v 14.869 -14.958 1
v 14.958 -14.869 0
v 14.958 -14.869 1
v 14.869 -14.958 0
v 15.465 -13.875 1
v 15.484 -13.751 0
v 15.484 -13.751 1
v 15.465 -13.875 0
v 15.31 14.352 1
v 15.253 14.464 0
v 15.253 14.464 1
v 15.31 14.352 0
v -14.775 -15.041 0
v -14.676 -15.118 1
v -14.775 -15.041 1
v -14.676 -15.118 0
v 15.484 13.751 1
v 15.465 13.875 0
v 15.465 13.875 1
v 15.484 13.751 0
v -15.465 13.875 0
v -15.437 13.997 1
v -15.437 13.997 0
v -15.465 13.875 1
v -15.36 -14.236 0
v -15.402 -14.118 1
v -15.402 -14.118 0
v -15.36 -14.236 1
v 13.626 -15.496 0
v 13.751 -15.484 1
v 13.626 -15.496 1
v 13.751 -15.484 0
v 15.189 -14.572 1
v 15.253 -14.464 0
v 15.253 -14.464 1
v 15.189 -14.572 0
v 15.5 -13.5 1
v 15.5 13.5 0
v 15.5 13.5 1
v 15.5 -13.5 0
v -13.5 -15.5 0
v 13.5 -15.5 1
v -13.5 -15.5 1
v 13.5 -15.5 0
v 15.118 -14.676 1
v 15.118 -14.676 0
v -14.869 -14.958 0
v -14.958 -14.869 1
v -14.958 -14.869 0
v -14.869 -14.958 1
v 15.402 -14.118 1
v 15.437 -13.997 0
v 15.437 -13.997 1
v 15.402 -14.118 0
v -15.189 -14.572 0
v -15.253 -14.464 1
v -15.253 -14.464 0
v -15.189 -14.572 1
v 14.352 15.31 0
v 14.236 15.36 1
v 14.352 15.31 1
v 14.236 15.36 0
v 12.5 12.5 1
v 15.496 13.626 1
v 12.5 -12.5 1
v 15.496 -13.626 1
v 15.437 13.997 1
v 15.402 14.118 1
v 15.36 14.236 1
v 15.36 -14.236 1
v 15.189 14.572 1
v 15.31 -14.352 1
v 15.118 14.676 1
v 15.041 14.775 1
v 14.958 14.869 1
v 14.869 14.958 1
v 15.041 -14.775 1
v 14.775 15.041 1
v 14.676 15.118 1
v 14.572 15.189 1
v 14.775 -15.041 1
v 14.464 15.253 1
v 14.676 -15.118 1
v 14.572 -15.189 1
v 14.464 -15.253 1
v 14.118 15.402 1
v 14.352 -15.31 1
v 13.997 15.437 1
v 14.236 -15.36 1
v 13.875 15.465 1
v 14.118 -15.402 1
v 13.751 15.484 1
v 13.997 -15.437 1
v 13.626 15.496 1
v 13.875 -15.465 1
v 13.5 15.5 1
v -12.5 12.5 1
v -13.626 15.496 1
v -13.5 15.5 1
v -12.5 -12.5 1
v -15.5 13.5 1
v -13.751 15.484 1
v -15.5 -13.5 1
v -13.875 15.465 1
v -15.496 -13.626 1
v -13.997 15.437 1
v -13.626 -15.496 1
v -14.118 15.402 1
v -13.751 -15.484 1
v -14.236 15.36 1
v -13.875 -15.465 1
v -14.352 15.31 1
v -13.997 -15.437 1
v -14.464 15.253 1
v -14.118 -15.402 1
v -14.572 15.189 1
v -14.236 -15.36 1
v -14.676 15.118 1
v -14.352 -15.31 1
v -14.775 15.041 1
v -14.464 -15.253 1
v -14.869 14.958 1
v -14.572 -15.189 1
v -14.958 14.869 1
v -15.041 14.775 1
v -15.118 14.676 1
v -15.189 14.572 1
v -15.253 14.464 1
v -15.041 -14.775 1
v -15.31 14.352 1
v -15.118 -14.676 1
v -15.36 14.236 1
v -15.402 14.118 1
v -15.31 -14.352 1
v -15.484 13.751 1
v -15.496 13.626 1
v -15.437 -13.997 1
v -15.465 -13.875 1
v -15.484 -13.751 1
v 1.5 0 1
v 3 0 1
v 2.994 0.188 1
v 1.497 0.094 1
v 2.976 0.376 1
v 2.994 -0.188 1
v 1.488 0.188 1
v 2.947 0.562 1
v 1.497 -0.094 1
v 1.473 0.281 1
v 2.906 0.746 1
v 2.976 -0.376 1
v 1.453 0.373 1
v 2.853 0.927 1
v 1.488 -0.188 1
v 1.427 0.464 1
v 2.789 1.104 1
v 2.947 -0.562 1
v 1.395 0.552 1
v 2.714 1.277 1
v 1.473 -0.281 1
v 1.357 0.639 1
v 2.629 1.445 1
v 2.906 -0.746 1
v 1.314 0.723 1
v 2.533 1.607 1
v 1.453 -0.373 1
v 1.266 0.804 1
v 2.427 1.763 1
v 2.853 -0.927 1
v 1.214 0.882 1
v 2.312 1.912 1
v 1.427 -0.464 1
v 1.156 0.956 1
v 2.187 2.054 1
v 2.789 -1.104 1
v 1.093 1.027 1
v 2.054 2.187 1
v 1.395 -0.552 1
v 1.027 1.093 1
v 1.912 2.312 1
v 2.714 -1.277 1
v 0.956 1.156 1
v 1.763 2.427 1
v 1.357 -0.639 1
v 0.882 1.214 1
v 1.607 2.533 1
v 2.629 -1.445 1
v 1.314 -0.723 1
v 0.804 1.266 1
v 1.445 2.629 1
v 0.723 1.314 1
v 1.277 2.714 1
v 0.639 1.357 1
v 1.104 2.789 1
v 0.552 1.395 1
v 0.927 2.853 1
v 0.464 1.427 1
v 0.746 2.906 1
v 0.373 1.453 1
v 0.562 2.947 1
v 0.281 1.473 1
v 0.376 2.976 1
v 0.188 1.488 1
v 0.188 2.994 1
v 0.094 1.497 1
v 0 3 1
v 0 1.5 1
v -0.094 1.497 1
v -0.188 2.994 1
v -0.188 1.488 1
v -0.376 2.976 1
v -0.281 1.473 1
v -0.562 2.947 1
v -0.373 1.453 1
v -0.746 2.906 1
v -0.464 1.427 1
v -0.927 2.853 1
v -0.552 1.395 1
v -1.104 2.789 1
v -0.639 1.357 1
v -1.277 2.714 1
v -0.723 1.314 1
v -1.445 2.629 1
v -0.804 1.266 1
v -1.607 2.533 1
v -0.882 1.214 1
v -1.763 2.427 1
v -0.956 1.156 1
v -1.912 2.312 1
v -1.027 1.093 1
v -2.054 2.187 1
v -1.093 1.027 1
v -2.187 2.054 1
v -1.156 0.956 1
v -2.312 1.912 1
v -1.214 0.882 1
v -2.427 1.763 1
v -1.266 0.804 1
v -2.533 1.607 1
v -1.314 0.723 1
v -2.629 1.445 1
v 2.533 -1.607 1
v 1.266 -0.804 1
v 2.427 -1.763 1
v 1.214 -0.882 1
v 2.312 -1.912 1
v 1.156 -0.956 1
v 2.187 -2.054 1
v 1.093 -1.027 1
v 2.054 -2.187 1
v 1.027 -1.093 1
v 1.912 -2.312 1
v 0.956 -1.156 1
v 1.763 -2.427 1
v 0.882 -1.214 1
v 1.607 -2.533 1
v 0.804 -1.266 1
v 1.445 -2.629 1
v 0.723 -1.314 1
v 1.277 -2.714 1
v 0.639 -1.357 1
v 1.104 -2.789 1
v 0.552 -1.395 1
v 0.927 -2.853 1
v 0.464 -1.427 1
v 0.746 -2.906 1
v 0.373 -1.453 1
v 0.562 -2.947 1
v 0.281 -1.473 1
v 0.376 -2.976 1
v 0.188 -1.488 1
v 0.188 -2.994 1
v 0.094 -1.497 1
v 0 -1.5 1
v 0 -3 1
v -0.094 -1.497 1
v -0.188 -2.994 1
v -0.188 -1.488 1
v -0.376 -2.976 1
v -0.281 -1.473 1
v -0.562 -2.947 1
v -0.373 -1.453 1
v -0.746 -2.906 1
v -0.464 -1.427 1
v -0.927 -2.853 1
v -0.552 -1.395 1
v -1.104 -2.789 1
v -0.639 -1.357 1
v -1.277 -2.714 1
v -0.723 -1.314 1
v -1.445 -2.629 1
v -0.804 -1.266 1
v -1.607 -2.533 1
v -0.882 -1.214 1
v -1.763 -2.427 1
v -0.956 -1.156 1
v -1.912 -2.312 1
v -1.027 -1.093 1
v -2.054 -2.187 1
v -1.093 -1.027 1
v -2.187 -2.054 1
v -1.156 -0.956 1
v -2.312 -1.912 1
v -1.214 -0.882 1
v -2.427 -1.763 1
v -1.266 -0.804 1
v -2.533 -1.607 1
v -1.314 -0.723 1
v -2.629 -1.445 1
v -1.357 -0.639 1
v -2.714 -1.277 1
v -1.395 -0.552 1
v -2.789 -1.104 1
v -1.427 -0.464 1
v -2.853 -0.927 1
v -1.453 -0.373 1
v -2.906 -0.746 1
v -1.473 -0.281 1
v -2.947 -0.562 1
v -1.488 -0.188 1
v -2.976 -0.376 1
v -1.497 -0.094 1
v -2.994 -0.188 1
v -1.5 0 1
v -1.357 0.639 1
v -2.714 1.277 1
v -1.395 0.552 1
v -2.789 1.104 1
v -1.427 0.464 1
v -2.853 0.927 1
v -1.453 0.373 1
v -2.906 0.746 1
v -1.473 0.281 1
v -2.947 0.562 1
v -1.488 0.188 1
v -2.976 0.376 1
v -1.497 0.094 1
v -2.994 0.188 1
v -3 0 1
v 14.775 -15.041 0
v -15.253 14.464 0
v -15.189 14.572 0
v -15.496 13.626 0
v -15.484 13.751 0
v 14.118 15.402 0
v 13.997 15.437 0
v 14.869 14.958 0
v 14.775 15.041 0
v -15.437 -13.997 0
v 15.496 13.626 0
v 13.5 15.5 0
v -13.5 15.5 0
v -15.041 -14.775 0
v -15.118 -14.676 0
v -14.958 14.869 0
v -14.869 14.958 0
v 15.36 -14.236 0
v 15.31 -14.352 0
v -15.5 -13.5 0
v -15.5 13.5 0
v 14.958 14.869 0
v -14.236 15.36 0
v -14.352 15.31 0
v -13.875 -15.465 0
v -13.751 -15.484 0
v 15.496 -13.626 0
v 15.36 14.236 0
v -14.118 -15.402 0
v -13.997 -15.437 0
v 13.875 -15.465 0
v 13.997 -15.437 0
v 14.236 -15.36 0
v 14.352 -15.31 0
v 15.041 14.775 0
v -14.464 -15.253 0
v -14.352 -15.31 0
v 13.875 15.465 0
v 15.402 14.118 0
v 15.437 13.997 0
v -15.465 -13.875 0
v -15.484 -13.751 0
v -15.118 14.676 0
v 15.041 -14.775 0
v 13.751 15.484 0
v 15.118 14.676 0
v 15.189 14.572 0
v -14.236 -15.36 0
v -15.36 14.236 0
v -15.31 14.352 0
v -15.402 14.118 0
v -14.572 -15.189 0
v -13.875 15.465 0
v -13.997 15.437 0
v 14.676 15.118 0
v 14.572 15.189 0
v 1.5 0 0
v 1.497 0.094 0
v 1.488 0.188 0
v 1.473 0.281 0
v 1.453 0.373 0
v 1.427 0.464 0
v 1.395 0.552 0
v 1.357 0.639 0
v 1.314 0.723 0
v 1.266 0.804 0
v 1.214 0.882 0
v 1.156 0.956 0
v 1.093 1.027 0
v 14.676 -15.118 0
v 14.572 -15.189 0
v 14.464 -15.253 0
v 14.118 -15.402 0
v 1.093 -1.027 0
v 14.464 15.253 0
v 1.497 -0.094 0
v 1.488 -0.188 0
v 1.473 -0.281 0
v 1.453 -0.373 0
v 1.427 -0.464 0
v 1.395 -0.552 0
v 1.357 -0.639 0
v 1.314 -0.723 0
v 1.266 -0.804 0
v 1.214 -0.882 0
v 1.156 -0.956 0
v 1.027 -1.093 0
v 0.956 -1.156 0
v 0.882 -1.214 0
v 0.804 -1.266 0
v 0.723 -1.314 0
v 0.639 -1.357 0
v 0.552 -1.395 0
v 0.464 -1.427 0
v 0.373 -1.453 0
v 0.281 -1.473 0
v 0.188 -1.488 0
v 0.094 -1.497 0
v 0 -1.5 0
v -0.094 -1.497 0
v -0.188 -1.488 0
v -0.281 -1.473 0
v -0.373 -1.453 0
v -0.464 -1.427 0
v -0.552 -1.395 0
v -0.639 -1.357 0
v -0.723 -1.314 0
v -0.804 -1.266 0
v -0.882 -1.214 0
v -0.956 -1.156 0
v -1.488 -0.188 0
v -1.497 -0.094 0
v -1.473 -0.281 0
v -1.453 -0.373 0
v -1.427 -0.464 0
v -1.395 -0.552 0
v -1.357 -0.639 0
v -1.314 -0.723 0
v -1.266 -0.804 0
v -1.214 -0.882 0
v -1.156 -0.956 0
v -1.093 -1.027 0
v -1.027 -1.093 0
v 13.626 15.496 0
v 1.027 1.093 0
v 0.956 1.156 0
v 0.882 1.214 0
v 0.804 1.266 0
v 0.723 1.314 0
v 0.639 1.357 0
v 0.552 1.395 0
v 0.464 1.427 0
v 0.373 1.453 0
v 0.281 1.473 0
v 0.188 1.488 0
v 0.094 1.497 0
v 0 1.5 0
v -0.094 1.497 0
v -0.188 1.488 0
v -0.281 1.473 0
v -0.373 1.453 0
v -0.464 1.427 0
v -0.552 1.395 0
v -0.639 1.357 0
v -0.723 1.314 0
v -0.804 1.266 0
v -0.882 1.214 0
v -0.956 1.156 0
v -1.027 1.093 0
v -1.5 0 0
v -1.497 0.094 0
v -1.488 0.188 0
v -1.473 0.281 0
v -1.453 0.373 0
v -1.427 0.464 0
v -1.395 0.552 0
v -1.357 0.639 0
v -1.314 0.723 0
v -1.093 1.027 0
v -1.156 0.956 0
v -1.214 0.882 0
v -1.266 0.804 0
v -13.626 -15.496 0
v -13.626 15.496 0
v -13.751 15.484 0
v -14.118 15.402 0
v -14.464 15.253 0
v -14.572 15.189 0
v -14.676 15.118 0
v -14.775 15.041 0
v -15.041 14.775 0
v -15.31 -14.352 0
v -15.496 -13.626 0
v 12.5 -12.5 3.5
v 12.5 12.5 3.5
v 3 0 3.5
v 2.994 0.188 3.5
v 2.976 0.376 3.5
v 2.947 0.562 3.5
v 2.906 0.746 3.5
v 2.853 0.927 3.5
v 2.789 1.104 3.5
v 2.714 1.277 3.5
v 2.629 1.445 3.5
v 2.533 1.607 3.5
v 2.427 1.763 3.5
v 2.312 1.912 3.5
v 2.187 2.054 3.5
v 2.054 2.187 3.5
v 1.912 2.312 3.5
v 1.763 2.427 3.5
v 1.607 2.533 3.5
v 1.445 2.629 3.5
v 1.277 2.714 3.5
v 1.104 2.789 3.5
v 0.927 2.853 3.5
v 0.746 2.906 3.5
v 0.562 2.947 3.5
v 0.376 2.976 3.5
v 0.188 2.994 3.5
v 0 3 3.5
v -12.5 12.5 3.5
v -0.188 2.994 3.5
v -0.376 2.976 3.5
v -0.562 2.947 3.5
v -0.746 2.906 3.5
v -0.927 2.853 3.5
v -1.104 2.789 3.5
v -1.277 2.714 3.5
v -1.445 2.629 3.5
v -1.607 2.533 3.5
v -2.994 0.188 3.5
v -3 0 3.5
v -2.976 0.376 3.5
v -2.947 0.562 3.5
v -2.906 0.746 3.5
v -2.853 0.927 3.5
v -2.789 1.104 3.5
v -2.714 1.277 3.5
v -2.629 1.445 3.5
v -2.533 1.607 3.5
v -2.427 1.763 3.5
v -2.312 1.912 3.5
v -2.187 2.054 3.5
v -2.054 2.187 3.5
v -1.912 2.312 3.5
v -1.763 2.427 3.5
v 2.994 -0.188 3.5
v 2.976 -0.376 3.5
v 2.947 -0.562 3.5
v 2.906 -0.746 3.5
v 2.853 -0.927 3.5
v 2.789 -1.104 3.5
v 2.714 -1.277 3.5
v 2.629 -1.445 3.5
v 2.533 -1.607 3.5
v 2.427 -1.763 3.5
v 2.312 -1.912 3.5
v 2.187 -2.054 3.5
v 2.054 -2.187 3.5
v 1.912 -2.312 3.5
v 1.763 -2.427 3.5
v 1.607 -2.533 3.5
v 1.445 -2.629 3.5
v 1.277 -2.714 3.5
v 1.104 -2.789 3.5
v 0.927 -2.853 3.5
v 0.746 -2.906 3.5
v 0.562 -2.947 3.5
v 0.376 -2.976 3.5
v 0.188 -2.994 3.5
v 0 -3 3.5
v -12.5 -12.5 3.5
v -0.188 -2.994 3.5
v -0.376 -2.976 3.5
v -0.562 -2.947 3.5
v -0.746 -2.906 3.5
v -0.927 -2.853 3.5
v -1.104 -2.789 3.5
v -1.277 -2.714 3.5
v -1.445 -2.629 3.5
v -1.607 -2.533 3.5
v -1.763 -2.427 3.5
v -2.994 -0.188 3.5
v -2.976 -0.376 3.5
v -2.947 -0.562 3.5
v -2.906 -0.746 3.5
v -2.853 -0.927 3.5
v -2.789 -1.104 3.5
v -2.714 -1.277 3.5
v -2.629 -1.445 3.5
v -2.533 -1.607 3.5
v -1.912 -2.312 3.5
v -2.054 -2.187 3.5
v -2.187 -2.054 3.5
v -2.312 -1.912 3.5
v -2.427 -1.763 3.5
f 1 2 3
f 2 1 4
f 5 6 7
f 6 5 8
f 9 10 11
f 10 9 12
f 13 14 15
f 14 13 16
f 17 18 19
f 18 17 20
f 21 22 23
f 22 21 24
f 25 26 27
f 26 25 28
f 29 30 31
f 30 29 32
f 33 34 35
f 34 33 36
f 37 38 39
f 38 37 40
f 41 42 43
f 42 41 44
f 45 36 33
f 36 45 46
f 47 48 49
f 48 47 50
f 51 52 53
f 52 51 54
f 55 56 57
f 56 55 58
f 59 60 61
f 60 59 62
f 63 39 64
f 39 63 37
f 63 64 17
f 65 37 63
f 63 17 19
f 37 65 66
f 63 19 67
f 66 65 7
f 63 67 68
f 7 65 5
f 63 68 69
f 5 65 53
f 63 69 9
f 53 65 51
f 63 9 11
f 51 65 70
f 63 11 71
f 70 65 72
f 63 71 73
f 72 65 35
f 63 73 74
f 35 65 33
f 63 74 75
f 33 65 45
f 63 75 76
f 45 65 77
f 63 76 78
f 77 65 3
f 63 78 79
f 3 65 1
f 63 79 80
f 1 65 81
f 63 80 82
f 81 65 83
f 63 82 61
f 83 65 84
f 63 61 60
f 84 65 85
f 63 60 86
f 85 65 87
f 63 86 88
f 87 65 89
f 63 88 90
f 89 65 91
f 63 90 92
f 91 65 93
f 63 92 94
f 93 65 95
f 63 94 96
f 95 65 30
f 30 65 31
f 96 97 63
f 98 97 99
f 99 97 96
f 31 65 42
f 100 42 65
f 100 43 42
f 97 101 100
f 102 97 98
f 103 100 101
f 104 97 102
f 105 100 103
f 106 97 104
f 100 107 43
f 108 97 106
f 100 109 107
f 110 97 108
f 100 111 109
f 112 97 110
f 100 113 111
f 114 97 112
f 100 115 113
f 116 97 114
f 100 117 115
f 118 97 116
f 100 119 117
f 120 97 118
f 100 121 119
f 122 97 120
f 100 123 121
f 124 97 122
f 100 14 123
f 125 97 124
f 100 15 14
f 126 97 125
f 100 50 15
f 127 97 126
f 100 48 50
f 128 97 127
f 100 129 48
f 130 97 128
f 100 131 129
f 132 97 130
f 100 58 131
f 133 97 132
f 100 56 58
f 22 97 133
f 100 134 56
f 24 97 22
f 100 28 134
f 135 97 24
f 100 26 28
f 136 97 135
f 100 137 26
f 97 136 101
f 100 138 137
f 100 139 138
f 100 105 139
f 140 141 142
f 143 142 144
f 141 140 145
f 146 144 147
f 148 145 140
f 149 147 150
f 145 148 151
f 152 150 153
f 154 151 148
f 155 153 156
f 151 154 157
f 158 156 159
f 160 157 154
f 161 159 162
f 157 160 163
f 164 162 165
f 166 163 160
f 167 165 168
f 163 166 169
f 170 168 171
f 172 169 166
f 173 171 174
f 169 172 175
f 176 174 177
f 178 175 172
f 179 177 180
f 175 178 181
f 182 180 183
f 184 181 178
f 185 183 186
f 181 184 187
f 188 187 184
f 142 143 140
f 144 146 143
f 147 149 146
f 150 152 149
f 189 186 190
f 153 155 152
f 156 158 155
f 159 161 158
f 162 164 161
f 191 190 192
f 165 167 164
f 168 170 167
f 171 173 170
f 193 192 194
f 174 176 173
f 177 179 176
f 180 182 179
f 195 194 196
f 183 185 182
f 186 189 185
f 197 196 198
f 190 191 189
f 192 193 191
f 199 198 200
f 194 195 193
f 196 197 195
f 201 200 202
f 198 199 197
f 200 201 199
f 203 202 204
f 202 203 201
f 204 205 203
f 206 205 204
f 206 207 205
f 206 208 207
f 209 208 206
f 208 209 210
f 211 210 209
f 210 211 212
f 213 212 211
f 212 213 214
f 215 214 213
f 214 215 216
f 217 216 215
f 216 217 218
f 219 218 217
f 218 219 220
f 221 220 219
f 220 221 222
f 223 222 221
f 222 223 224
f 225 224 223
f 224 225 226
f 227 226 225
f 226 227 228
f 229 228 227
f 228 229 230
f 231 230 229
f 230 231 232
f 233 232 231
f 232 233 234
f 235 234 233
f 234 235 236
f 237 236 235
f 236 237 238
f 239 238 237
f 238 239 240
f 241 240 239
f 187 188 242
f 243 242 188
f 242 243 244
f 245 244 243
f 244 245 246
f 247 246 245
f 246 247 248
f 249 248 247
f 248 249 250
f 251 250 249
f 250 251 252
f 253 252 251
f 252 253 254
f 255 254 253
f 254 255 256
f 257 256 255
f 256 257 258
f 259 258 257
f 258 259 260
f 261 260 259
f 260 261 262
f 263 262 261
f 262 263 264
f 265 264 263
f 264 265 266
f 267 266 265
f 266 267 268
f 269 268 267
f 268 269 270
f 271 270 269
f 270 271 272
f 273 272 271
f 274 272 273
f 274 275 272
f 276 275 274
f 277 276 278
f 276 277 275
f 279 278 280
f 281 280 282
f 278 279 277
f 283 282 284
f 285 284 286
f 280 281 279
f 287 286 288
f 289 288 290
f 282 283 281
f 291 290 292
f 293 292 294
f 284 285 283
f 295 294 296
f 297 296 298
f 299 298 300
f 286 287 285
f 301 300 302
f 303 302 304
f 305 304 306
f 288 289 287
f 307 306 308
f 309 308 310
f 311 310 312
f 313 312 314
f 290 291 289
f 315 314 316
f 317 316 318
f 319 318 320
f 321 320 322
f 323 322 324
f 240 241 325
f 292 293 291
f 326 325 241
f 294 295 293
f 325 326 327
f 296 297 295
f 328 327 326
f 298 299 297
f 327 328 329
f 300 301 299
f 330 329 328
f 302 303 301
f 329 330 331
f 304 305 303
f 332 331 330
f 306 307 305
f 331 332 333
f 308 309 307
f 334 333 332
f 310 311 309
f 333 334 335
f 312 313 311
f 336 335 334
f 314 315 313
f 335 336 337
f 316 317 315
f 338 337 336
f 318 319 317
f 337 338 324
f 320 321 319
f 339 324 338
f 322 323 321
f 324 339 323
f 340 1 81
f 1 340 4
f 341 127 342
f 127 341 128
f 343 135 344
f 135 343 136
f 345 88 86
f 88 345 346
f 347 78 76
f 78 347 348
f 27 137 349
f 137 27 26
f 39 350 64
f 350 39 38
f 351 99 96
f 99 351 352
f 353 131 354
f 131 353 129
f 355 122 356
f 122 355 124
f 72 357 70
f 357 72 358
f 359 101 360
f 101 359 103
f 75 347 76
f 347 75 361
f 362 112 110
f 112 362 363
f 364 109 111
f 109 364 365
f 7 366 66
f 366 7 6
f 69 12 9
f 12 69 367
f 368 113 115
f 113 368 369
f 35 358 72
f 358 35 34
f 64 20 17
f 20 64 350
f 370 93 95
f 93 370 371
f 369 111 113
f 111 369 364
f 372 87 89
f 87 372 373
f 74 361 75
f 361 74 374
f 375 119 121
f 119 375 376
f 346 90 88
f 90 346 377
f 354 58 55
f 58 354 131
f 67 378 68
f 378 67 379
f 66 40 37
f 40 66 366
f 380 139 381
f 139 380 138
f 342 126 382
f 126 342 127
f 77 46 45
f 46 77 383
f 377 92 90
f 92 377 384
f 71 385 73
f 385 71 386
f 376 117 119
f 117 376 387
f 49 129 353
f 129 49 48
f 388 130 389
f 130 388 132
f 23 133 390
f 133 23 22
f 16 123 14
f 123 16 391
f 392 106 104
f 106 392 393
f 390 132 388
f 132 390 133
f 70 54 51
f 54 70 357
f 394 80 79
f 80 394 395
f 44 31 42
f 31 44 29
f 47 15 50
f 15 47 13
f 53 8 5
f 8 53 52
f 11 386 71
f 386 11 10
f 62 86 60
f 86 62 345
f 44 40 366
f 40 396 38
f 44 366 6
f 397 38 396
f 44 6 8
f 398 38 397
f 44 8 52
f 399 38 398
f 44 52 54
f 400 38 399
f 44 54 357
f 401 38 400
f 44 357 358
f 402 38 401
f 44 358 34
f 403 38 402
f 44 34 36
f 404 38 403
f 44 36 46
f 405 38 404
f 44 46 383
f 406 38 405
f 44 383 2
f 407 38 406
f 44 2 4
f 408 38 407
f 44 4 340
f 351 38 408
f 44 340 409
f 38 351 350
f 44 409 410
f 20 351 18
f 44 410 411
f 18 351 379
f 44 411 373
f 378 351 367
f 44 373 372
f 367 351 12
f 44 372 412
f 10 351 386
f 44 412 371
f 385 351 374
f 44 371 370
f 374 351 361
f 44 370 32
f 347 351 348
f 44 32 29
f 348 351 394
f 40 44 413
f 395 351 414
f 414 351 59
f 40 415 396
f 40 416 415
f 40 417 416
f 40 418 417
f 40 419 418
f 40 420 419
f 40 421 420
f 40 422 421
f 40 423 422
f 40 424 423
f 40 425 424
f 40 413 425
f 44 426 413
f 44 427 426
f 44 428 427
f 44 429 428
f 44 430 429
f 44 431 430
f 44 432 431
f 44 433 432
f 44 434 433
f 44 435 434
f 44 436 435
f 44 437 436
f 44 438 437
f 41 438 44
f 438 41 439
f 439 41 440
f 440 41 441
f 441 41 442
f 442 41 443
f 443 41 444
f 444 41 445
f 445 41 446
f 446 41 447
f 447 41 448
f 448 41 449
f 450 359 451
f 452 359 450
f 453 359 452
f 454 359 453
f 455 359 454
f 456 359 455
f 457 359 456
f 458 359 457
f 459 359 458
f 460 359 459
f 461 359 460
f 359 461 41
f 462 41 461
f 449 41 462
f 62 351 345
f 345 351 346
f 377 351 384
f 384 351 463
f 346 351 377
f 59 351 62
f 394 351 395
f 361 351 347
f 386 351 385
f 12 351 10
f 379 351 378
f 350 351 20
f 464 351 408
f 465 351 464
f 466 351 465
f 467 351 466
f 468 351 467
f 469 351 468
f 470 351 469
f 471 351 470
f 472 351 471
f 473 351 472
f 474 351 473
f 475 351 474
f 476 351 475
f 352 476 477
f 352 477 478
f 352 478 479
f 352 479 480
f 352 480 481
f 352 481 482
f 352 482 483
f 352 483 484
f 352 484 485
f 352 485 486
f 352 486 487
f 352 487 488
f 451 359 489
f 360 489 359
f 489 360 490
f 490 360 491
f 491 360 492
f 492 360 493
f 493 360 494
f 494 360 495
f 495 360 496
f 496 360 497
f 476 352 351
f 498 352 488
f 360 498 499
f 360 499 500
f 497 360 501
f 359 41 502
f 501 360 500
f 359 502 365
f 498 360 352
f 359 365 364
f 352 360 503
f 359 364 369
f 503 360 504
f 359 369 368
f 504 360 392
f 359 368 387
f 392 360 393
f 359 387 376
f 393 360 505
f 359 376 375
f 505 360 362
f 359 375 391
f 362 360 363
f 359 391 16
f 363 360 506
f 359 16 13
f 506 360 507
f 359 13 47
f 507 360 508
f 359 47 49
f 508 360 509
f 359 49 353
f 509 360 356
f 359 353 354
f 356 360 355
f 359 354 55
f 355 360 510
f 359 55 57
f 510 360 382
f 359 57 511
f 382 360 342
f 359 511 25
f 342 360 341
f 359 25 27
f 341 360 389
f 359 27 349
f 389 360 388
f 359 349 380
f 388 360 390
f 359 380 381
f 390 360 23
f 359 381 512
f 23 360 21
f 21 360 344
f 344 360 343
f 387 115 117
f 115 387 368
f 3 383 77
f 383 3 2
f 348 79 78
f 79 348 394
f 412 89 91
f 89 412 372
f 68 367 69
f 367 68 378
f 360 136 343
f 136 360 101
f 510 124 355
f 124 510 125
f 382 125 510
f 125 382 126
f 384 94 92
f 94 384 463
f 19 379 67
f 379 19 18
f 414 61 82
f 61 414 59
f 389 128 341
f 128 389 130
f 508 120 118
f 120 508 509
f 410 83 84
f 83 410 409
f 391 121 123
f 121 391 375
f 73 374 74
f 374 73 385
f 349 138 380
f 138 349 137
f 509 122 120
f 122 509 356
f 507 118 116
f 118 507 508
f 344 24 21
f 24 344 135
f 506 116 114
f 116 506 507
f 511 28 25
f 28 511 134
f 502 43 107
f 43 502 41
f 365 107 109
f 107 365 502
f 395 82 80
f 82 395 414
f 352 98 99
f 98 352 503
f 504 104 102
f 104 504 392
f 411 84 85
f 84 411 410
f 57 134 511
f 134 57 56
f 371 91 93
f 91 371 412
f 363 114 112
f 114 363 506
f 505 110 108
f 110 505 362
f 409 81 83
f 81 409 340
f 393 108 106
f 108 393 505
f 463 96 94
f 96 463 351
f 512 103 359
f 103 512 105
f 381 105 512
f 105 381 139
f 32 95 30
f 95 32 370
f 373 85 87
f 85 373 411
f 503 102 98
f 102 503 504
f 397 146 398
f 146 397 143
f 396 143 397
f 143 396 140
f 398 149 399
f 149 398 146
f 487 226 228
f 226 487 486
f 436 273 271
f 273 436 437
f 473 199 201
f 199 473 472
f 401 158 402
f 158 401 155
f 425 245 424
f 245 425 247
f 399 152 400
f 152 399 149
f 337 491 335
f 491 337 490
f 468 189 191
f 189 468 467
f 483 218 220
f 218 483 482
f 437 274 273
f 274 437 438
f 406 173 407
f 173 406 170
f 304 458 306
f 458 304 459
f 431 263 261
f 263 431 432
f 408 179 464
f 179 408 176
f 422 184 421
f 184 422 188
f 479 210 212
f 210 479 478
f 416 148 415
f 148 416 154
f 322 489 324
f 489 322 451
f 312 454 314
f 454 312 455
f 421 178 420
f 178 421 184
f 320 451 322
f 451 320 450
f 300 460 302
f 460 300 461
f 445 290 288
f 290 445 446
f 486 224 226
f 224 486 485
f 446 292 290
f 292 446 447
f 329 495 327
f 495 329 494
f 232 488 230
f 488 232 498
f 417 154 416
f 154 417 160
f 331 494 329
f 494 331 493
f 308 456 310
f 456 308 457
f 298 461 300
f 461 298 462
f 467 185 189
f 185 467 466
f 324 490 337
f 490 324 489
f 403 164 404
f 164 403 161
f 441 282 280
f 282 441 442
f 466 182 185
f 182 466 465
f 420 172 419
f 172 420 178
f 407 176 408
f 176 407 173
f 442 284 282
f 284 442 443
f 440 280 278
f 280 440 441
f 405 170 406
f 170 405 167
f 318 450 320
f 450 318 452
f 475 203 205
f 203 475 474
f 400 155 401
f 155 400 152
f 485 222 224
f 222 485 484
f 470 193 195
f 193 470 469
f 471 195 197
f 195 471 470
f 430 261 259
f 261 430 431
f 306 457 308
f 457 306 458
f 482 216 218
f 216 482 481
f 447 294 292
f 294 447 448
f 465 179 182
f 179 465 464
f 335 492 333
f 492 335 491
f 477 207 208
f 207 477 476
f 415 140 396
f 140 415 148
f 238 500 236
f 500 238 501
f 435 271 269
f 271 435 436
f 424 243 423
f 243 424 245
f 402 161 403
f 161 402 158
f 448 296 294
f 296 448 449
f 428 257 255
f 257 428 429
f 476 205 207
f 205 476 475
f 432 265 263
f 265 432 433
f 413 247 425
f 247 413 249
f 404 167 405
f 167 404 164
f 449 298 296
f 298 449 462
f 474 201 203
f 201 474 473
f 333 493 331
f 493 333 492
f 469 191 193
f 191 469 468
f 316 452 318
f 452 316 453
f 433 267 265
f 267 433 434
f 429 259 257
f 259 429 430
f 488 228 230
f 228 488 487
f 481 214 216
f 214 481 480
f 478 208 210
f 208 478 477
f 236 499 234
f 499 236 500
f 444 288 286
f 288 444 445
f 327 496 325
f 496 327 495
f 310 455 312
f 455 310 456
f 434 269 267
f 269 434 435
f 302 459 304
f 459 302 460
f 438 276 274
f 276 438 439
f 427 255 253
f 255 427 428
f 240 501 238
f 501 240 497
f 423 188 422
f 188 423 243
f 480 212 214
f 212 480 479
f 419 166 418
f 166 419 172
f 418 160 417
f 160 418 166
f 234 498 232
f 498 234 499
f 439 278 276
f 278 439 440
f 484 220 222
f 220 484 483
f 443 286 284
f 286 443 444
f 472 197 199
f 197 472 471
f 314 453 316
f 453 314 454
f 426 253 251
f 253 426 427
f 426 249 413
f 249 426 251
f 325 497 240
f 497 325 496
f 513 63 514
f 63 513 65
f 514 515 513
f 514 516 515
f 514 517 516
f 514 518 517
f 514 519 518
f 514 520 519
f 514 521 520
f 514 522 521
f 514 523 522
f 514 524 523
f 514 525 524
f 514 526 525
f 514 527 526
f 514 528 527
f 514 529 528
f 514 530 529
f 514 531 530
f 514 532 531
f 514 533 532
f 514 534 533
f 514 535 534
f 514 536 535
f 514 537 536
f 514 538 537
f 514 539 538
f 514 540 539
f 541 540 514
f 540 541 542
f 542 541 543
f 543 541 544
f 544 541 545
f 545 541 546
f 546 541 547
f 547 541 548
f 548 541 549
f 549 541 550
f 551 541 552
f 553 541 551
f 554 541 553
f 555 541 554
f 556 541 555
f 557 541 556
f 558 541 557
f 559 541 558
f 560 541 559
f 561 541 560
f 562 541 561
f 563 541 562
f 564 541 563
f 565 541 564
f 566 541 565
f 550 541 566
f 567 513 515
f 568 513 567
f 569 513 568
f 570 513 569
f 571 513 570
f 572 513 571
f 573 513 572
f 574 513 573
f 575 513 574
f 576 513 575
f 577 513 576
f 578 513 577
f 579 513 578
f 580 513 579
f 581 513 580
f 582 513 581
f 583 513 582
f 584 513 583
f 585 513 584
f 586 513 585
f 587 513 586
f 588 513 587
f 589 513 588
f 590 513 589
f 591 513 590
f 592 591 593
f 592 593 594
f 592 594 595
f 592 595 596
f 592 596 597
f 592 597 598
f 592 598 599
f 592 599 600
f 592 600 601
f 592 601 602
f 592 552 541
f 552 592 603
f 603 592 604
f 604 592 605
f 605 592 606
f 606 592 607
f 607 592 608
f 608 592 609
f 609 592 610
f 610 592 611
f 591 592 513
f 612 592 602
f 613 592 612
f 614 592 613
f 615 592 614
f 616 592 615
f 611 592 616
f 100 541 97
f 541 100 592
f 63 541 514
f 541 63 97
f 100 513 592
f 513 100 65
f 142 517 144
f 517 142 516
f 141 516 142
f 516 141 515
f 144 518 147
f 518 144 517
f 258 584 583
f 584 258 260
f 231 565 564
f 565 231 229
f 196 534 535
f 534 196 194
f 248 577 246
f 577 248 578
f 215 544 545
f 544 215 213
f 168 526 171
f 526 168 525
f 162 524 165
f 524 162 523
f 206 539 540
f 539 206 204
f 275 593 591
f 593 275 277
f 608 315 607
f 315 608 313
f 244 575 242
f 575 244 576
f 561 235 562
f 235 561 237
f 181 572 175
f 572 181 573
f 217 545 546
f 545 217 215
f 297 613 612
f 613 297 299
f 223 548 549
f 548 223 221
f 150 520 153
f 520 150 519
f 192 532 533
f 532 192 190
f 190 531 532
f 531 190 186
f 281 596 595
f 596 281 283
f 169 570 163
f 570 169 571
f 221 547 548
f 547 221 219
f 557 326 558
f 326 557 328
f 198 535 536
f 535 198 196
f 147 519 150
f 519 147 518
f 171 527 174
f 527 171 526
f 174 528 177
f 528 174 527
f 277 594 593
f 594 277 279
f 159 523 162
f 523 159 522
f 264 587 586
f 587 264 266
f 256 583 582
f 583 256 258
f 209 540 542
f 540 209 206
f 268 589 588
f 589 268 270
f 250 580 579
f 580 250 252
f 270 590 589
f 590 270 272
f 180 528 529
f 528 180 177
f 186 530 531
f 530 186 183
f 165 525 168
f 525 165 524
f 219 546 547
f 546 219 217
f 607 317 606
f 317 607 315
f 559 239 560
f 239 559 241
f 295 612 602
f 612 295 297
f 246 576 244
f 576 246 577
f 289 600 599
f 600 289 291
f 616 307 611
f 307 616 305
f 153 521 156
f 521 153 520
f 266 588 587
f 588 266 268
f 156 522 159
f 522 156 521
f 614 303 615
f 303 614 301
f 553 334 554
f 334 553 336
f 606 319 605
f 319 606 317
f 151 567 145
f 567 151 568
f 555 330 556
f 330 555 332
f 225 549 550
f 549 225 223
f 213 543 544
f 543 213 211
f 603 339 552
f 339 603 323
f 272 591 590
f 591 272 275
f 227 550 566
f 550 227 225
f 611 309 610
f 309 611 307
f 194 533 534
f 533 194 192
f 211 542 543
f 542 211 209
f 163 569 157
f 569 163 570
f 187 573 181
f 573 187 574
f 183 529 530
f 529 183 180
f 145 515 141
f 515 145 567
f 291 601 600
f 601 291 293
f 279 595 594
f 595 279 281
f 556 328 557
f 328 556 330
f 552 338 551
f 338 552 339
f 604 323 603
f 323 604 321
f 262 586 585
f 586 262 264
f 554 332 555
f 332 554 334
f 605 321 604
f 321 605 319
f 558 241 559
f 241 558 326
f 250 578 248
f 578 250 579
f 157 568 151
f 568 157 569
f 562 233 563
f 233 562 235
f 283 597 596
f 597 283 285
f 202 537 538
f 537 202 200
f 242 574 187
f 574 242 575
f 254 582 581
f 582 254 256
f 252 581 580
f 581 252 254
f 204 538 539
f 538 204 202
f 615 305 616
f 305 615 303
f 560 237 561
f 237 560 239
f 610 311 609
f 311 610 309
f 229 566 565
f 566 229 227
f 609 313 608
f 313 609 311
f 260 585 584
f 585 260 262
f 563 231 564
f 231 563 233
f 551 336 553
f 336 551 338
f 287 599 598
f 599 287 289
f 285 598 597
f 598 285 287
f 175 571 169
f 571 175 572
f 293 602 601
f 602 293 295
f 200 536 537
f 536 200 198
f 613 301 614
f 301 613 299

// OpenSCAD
$fn = 100;

Magnet_Outer_Diameter = 27.0; // mm
Magnet_Inner_Diameter = 16.0; // mm
Magnet_Height = 5.0; // mm

Border_Bottom = 1.0; // mm
Border_Side = 2.0; // mm

LED_Diameter = 5.0; // mm
LED_Full_Distance = 12.0; // mm
LED_Height = 8.0; // mm
LED_Z_Offset = LED_Height - Magnet_Height; // mm

Corner_Radius = 2.0; // mm
InnerWidth_X = 25.0; // mm
InnerWidth_Y = 25.0; // mm
InnerHeight = 19.0; // mm

USBPort_Width = 13.0; // mm
USBPort_Height = 6.0; // mm
USBPort_Offset_Y = 11.5; // mm
USBPort_Offset_Z = 13.5; // mm

//MagnetRing();
//ModuleBox();
Cap();

module Cap()
{
    translate([0, 0, 0])
    {
        difference()
        {
            roundrect([InnerWidth_X + Border_Side, InnerWidth_Y + Border_Side], Corner_Radius, height=Border_Bottom);
            cylinder(h=100, d=3, center = true);
        }
    }
    translate([0, 0, 2*Border_Bottom])
    {
        difference()
        {
            cube([InnerWidth_X, InnerWidth_Y, 3*Border_Bottom], center = true);
            cylinder(h=100, d=6, center = true);
        }
    }
}

module MagnetRing()
{
    translate([30, 0, 0])
    {
        difference()
        {
            cylinder(h = Magnet_Height + Border_Bottom +  LED_Z_Offset, d = Magnet_Outer_Diameter + 2*Border_Side);
            translate([0, 0, Border_Bottom])
            {
                Magnet(Magnet_Height + LED_Z_Offset);
            }
            LEDHole(1);
            LEDHole(-1);
        }
    }
}

module ModuleBox()
{
    translate([0, 0, Magnet_Height + Border_Bottom + LED_Z_Offset])
    {
        Box();
        translate([0, 0, -LED_Z_Offset])
        {
            Magnet(LED_Z_Offset);
        }
    }
}

module LEDHole(direction)
{
    translate([(LED_Full_Distance-LED_Diameter)/2*direction, 0, 0])
    {
        cylinder(h = 10.0, d = LED_Diameter);
    }
}

module Magnet(height)
{
    difference()
    {
        cylinder(h = height, d = Magnet_Outer_Diameter);
        translate([0, 0, 0])
        {
            cylinder(h = height, d = Magnet_Inner_Diameter);
        }
    }
}

module Box()
{
    difference()
    {
        translate([0, 0, 0])
        {
            roundrect([InnerWidth_X + Border_Side, InnerWidth_Y + Border_Side], Corner_Radius, height=InnerHeight + 2*Border_Bottom);
        }
        translate([0, 0, Magnet_Height + LED_Z_Offset + 3*Border_Bottom])
        {
            cube([InnerWidth_X, InnerWidth_Y, InnerHeight + 2*Border_Bottom], center = true);
        }

        LEDHole(1);
        LEDHole(-1);
        USBHole();
    }
}

module USBHole()
{
    translate([0, 2.5-USBPort_Offset_Y, USBPort_Offset_Z])
    {
        cube([20, USBPort_Width, USBPort_Height]);
    }
}

module roundrect(size, radius, height)
{
    hull()
    {
        for (i = [0:3])
        {
            x = size.x * (i % 2 - 0.5);
            y = size.y * (floor(i/2) - 0.5);
            translate([x, y, 0])
            {
                cylinder(r = radius, h = height);
            }
        }
    }
}
 
